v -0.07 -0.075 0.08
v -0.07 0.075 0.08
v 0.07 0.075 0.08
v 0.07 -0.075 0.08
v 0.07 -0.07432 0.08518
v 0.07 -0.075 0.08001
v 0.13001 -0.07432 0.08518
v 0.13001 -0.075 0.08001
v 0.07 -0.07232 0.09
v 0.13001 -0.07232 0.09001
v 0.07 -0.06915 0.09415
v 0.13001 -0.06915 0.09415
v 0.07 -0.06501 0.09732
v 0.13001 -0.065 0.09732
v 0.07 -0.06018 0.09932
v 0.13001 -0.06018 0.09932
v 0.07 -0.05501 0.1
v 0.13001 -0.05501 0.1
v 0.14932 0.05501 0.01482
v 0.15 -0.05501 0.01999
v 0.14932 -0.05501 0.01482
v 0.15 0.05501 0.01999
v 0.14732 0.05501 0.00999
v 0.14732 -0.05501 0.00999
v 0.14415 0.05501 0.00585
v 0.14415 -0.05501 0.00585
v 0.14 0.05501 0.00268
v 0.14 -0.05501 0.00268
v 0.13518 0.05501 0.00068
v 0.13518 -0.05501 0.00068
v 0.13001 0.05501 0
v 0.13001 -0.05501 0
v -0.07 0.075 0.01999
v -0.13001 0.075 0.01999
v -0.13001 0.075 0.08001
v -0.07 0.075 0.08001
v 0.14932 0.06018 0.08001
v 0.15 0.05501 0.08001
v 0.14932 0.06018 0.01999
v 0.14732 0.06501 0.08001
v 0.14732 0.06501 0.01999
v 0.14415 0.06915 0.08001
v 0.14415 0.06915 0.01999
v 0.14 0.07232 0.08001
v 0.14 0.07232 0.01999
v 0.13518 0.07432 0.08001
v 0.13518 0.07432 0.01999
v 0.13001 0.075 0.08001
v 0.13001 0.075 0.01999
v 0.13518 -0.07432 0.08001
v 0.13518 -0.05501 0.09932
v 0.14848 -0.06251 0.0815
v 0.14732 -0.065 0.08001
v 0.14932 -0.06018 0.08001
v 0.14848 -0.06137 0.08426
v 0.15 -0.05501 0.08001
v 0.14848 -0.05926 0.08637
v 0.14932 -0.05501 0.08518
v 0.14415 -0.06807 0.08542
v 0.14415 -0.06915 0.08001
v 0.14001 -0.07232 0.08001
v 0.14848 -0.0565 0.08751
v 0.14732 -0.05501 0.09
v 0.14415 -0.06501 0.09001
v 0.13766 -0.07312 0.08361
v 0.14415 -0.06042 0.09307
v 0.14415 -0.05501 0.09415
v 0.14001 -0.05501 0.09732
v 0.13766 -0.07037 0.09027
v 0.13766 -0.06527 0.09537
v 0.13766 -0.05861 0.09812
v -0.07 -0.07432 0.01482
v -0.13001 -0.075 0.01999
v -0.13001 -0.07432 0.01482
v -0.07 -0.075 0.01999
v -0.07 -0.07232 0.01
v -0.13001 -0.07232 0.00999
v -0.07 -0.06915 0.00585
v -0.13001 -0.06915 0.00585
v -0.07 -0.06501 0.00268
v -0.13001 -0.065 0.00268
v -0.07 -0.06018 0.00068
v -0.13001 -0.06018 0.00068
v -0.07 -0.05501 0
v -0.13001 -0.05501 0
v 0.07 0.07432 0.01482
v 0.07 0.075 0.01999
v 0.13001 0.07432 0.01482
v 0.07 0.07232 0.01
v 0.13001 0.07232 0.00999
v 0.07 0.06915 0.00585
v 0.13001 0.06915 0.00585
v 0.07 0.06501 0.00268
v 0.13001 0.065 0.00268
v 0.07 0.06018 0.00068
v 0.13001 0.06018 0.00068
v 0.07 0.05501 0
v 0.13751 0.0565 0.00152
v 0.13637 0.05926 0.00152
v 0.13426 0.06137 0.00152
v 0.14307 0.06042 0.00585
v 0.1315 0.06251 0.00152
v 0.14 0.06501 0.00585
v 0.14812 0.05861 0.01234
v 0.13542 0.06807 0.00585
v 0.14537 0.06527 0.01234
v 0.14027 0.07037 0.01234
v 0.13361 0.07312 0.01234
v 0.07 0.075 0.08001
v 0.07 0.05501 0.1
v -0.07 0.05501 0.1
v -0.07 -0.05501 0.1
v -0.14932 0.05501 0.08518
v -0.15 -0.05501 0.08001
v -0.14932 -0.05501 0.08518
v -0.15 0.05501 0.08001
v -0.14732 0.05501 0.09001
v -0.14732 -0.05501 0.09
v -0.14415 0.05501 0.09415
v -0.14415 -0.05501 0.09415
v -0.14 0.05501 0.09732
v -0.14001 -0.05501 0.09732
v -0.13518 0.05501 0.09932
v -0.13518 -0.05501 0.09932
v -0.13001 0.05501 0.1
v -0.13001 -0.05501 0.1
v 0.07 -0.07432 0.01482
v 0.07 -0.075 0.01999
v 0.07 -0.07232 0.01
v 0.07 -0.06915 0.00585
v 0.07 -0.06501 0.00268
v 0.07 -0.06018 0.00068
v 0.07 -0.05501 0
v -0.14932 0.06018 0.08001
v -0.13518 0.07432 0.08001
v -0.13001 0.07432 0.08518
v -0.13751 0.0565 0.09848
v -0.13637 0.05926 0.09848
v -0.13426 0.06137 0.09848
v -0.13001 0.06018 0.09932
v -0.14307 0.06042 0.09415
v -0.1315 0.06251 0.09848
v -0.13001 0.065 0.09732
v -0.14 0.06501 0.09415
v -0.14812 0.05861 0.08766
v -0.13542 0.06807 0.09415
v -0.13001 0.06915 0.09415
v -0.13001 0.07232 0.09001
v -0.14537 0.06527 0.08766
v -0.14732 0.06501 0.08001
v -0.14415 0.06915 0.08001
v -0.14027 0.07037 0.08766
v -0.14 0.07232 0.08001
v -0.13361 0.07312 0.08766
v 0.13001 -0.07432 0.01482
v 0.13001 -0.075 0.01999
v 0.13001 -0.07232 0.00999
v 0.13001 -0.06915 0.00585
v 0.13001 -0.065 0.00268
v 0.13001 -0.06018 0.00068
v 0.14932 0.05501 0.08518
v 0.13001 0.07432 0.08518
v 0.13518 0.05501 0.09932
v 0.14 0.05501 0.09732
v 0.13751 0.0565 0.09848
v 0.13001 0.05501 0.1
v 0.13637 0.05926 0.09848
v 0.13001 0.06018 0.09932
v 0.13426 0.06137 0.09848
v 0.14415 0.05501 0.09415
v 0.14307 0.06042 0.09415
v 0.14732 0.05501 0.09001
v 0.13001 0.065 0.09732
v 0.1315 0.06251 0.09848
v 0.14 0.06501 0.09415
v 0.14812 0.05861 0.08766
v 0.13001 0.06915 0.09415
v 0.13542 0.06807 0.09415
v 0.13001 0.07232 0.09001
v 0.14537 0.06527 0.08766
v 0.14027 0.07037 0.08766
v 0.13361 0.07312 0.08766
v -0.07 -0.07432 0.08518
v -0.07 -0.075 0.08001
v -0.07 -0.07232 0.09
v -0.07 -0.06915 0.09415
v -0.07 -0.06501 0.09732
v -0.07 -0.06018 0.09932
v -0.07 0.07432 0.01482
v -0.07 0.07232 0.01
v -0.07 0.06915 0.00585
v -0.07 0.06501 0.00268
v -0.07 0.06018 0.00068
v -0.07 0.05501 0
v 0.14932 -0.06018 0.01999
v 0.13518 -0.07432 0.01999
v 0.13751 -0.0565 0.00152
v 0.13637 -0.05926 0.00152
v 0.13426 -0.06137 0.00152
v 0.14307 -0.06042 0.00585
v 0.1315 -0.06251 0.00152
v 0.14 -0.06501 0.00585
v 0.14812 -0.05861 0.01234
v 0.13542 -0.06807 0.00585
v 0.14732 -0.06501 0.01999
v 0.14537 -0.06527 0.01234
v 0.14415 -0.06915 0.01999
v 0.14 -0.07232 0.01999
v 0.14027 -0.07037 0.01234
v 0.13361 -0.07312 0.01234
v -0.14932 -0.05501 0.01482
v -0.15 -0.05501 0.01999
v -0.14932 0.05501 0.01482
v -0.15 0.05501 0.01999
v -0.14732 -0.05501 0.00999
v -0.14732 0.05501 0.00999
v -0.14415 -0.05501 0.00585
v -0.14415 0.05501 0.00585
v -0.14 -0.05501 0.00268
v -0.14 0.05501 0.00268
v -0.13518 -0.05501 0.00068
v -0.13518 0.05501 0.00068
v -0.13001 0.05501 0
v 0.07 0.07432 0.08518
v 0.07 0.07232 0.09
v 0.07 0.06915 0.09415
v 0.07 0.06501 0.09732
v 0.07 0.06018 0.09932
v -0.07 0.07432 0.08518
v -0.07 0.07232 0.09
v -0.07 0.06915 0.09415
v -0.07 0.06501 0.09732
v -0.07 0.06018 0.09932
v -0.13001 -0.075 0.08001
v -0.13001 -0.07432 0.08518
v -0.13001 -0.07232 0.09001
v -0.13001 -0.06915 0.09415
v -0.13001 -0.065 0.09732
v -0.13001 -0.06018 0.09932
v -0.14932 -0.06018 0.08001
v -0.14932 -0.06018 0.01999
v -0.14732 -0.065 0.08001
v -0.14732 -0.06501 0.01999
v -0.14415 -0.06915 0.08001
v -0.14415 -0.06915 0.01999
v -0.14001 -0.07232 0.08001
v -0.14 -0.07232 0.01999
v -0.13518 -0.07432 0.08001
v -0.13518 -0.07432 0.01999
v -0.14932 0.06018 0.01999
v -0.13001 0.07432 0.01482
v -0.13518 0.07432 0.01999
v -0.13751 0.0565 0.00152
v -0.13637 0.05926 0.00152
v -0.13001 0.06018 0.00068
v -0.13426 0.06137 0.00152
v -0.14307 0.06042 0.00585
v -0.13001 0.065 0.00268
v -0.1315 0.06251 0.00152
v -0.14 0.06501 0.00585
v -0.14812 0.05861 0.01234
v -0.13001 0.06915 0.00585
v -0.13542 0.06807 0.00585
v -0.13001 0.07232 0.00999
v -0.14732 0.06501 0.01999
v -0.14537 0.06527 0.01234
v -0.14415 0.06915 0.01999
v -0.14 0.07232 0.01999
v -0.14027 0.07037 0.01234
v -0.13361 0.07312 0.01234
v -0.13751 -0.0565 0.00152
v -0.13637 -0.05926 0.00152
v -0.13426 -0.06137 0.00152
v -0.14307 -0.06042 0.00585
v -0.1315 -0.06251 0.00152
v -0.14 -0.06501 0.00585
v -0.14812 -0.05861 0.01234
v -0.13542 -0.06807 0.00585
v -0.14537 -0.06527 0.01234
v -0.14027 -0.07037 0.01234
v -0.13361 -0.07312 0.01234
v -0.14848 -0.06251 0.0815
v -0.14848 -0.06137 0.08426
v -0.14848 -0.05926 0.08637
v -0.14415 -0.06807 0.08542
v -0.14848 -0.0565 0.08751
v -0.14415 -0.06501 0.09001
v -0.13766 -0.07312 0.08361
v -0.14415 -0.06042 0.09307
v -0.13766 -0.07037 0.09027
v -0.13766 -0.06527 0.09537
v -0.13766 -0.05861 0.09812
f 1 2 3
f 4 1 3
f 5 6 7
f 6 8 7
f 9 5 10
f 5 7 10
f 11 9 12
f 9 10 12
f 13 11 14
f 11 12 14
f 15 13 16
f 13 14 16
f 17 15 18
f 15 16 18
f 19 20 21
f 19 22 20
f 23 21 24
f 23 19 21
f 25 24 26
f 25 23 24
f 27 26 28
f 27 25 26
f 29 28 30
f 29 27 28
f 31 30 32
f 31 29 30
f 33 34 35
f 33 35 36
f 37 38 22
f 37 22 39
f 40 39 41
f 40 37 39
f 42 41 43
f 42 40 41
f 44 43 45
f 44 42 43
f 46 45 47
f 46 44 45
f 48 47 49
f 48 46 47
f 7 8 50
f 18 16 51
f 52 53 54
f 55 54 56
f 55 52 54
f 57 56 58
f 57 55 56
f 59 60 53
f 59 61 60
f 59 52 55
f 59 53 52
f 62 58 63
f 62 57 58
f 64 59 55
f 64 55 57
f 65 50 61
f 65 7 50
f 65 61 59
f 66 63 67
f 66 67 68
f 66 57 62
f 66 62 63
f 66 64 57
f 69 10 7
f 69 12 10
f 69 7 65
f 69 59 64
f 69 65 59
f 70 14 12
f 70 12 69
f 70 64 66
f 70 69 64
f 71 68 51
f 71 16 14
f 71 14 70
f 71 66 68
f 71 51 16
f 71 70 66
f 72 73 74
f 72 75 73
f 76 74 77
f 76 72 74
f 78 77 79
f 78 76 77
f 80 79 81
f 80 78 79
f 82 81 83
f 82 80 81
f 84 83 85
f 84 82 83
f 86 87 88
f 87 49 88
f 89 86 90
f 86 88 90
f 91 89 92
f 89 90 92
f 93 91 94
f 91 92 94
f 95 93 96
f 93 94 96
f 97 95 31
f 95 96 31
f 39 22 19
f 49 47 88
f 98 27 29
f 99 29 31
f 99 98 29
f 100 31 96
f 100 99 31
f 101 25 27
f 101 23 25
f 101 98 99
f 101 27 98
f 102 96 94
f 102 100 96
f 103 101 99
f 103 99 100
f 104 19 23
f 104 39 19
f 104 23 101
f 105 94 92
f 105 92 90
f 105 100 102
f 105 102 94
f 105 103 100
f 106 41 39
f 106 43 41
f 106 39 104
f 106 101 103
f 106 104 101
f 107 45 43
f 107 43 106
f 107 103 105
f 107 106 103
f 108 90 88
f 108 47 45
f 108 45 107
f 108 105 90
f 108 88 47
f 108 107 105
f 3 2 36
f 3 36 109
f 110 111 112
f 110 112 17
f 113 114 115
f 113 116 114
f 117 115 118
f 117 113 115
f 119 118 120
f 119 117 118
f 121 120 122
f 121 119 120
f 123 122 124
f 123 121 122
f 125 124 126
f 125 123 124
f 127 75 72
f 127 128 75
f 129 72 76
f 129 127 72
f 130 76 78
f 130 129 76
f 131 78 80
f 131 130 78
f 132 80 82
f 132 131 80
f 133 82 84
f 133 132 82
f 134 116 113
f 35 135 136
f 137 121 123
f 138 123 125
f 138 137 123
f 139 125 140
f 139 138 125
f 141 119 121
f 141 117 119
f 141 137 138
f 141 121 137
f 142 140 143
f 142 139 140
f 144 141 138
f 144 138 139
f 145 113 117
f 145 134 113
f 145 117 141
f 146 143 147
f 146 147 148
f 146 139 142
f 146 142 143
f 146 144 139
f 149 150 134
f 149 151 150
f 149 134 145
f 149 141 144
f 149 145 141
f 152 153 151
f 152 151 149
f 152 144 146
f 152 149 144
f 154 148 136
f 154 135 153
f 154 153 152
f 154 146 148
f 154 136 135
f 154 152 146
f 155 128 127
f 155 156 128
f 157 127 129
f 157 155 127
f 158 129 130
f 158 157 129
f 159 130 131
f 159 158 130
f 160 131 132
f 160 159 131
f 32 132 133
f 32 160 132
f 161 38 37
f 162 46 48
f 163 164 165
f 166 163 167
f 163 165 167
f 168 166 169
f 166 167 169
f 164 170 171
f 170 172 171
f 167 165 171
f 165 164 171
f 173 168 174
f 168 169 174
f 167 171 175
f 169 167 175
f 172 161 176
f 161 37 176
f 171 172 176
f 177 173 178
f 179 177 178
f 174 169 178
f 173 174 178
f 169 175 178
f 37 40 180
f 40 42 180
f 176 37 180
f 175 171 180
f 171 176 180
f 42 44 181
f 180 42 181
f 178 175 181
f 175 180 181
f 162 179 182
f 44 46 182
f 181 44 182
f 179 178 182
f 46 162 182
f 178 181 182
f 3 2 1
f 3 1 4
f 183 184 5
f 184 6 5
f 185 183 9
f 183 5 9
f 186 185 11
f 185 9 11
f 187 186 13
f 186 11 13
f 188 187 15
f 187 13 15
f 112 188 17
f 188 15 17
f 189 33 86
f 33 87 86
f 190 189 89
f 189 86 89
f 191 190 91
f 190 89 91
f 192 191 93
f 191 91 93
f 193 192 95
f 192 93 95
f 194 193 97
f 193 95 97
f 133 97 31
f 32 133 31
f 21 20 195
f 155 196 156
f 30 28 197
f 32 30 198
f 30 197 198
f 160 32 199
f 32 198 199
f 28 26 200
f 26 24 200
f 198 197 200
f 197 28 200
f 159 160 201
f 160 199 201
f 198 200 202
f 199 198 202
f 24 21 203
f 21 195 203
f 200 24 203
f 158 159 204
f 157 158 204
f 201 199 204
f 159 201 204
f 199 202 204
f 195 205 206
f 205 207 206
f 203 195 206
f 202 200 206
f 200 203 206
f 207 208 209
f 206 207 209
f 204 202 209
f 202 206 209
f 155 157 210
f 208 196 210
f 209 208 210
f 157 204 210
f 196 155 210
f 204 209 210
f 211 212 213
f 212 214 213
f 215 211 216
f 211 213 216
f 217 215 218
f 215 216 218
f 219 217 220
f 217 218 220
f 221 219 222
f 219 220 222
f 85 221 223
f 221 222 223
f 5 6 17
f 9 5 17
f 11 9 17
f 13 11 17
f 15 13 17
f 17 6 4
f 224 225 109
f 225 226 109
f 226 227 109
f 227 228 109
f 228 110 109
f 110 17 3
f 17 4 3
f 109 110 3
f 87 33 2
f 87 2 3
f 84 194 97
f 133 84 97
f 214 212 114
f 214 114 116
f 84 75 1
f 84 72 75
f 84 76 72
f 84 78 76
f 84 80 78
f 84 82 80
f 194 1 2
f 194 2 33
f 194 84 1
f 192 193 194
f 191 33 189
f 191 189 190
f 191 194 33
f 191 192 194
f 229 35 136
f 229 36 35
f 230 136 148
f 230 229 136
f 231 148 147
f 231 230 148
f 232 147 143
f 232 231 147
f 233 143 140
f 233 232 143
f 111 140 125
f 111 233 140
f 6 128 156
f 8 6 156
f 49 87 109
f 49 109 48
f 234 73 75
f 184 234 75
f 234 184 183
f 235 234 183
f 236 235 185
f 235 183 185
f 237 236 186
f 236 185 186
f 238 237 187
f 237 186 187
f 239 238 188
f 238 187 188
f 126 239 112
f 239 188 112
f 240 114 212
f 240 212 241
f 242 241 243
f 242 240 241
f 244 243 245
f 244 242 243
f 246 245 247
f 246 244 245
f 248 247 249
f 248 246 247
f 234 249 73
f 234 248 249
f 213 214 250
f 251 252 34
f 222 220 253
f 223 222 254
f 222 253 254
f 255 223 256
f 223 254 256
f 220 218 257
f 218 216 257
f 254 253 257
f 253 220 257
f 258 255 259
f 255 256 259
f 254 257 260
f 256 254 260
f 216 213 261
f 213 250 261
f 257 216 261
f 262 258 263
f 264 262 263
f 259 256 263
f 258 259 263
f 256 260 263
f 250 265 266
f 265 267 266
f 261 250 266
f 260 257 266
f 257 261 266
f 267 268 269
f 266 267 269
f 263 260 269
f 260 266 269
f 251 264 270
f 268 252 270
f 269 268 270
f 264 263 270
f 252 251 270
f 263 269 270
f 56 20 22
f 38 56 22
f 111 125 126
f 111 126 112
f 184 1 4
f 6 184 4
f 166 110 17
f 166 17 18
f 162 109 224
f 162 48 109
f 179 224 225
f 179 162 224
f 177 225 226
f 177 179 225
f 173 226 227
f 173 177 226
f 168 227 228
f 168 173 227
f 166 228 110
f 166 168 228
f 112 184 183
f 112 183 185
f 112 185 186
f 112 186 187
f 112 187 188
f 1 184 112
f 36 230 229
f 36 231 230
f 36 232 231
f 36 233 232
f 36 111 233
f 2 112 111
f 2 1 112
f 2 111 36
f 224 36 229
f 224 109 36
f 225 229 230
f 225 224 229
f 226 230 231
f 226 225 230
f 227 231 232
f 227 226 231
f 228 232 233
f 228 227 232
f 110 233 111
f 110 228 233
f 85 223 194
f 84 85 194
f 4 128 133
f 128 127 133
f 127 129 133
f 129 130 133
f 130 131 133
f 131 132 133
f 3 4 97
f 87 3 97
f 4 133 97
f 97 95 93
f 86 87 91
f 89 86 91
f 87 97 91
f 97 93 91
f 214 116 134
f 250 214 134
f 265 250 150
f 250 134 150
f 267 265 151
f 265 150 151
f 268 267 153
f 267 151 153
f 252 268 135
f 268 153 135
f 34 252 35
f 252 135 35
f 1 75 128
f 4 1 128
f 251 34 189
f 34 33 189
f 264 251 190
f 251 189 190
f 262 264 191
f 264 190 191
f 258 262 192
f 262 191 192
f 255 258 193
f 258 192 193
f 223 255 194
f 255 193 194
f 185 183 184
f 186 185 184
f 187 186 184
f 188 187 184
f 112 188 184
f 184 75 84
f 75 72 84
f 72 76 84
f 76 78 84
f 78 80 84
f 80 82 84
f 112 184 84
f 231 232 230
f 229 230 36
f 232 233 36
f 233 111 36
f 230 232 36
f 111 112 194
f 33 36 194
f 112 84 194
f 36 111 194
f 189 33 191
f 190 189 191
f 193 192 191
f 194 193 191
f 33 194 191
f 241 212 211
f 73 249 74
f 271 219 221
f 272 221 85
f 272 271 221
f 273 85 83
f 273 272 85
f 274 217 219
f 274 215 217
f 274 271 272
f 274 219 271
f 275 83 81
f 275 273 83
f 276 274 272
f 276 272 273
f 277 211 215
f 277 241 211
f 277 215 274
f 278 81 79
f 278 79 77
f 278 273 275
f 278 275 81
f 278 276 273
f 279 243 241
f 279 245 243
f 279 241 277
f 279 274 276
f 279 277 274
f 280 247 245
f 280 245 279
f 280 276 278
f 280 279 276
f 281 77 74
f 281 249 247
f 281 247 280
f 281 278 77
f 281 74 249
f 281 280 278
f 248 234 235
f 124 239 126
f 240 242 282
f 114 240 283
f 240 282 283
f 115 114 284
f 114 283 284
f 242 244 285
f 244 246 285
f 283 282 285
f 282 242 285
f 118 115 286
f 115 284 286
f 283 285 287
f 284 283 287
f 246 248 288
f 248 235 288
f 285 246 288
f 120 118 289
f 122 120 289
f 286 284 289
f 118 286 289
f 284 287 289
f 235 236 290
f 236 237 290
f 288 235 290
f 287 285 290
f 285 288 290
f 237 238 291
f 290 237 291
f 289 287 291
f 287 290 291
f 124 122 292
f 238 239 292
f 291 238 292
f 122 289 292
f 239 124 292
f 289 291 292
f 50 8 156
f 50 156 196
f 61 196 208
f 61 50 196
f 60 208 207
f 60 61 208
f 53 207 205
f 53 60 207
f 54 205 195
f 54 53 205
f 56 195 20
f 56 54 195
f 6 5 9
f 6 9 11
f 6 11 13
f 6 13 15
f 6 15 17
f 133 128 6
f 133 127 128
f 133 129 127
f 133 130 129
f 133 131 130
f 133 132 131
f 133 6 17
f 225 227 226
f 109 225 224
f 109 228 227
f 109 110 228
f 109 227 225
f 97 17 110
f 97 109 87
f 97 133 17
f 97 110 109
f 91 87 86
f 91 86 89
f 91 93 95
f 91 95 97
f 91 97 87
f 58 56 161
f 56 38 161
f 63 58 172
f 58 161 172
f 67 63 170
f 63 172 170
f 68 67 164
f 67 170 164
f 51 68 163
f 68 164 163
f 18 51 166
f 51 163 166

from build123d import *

# Parameters (mm, degrees)
F2_W     = 0.14
F2_H     = 0.15
F3_DEPTH = 0.08
F2_W_2   = 0.08
F4_DEPTH = 0.1
F5_DEPTH = 0.1
F6_DEPTH = 0.02
F7_R     = 0.01999
F7_2_R   = 0.01999
F7_3_R   = 0.01999
F7_4_R   = 0.01999


# Not quite as in the source:
# - a fillet or chamfer is up to 0.001 mm smaller than in the source, because OpenCascade refuses the exact size


with BuildPart() as f3:
    # F2 (on Top) → F3 (new body)
    with BuildSketch(Plane.XY):
        Rectangle(F2_W, F2_H)
    extrude(amount=F3_DEPTH)


with BuildPart() as f4:
    # F2 (on Top) → F4 (new body)
    with BuildSketch(Plane.XY):
        with Locations((-0.11, 0)):
            Rectangle(F2_W_2, F2_H)
    extrude(amount=F4_DEPTH)

    # F7 (radius 0.02 in the source; OpenCascade refuses exactly that, so slightly less here)
    f7_edges = [f4.edges().sort_by_distance(p)[0] for p in [
        (-0.11, -0.075, 0.1),
        (-0.15, 0.075, 0.05),
        (-0.15, -0.075, 0.05),
        (-0.15, 0, 0),
        (-0.15, 0, 0.1),
        (-0.11, 0.075, 0.1),
        (-0.11, 0.075, 0),
        (-0.11, -0.075, 0),
    ]]
    fillet(f7_edges, radius=F7_R)


with BuildPart() as f5:
    # F2 (on Top) → F5 (new body)
    with BuildSketch(Plane.XY):
        with Locations((0.11, 0)):
            Rectangle(F2_W_2, F2_H)
    extrude(amount=F5_DEPTH)

    # F7#2 (radius 0.02 in the source; OpenCascade refuses exactly that, so slightly less here)
    f7_2_edges = [f5.edges().sort_by_distance(p)[0] for p in [
        (0.11, -0.075, 0.1),
        (0.15, -0.075, 0.05),
        (0.15, 0.075, 0.05),
        (0.15, 0, 0),
        (0.15, 0, 0.1),
        (0.11, 0.075, 0.1),
        (0.11, 0.075, 0),
        (0.11, -0.075, 0),
    ]]
    fillet(f7_2_edges, radius=F7_2_R)


with BuildPart() as f6:
    # F6 (new): a face of the model
    f6_faces = [f3.part.faces().sort_by_distance(p)[0] for p in [
        (0, 0, 0.08),
    ]]
    extrude(f6_faces, amount=F6_DEPTH)

    # F7#4 (radius 0.02 in the source; OpenCascade refuses exactly that, so slightly less here)
    f7_4_edges = [f6.edges().sort_by_distance(p)[0] for p in [
        (0, -0.075, 0.1),
        (0, 0.075, 0.1),
    ]]
    fillet(f7_4_edges, radius=F7_4_R)


with BuildPart() as f3_1:
    add(f3.part)

    # F7#3 (radius 0.02 in the source; OpenCascade refuses exactly that, so slightly less here)
    f7_3_edges = [f3_1.edges().sort_by_distance(p)[0] for p in [
        (0, 0.075, 0),
        (0, -0.075, 0),
    ]]
    fillet(f7_3_edges, radius=F7_3_R)


solid = Compound([f4.part, f5.part, f6.part, f3_1.part])
